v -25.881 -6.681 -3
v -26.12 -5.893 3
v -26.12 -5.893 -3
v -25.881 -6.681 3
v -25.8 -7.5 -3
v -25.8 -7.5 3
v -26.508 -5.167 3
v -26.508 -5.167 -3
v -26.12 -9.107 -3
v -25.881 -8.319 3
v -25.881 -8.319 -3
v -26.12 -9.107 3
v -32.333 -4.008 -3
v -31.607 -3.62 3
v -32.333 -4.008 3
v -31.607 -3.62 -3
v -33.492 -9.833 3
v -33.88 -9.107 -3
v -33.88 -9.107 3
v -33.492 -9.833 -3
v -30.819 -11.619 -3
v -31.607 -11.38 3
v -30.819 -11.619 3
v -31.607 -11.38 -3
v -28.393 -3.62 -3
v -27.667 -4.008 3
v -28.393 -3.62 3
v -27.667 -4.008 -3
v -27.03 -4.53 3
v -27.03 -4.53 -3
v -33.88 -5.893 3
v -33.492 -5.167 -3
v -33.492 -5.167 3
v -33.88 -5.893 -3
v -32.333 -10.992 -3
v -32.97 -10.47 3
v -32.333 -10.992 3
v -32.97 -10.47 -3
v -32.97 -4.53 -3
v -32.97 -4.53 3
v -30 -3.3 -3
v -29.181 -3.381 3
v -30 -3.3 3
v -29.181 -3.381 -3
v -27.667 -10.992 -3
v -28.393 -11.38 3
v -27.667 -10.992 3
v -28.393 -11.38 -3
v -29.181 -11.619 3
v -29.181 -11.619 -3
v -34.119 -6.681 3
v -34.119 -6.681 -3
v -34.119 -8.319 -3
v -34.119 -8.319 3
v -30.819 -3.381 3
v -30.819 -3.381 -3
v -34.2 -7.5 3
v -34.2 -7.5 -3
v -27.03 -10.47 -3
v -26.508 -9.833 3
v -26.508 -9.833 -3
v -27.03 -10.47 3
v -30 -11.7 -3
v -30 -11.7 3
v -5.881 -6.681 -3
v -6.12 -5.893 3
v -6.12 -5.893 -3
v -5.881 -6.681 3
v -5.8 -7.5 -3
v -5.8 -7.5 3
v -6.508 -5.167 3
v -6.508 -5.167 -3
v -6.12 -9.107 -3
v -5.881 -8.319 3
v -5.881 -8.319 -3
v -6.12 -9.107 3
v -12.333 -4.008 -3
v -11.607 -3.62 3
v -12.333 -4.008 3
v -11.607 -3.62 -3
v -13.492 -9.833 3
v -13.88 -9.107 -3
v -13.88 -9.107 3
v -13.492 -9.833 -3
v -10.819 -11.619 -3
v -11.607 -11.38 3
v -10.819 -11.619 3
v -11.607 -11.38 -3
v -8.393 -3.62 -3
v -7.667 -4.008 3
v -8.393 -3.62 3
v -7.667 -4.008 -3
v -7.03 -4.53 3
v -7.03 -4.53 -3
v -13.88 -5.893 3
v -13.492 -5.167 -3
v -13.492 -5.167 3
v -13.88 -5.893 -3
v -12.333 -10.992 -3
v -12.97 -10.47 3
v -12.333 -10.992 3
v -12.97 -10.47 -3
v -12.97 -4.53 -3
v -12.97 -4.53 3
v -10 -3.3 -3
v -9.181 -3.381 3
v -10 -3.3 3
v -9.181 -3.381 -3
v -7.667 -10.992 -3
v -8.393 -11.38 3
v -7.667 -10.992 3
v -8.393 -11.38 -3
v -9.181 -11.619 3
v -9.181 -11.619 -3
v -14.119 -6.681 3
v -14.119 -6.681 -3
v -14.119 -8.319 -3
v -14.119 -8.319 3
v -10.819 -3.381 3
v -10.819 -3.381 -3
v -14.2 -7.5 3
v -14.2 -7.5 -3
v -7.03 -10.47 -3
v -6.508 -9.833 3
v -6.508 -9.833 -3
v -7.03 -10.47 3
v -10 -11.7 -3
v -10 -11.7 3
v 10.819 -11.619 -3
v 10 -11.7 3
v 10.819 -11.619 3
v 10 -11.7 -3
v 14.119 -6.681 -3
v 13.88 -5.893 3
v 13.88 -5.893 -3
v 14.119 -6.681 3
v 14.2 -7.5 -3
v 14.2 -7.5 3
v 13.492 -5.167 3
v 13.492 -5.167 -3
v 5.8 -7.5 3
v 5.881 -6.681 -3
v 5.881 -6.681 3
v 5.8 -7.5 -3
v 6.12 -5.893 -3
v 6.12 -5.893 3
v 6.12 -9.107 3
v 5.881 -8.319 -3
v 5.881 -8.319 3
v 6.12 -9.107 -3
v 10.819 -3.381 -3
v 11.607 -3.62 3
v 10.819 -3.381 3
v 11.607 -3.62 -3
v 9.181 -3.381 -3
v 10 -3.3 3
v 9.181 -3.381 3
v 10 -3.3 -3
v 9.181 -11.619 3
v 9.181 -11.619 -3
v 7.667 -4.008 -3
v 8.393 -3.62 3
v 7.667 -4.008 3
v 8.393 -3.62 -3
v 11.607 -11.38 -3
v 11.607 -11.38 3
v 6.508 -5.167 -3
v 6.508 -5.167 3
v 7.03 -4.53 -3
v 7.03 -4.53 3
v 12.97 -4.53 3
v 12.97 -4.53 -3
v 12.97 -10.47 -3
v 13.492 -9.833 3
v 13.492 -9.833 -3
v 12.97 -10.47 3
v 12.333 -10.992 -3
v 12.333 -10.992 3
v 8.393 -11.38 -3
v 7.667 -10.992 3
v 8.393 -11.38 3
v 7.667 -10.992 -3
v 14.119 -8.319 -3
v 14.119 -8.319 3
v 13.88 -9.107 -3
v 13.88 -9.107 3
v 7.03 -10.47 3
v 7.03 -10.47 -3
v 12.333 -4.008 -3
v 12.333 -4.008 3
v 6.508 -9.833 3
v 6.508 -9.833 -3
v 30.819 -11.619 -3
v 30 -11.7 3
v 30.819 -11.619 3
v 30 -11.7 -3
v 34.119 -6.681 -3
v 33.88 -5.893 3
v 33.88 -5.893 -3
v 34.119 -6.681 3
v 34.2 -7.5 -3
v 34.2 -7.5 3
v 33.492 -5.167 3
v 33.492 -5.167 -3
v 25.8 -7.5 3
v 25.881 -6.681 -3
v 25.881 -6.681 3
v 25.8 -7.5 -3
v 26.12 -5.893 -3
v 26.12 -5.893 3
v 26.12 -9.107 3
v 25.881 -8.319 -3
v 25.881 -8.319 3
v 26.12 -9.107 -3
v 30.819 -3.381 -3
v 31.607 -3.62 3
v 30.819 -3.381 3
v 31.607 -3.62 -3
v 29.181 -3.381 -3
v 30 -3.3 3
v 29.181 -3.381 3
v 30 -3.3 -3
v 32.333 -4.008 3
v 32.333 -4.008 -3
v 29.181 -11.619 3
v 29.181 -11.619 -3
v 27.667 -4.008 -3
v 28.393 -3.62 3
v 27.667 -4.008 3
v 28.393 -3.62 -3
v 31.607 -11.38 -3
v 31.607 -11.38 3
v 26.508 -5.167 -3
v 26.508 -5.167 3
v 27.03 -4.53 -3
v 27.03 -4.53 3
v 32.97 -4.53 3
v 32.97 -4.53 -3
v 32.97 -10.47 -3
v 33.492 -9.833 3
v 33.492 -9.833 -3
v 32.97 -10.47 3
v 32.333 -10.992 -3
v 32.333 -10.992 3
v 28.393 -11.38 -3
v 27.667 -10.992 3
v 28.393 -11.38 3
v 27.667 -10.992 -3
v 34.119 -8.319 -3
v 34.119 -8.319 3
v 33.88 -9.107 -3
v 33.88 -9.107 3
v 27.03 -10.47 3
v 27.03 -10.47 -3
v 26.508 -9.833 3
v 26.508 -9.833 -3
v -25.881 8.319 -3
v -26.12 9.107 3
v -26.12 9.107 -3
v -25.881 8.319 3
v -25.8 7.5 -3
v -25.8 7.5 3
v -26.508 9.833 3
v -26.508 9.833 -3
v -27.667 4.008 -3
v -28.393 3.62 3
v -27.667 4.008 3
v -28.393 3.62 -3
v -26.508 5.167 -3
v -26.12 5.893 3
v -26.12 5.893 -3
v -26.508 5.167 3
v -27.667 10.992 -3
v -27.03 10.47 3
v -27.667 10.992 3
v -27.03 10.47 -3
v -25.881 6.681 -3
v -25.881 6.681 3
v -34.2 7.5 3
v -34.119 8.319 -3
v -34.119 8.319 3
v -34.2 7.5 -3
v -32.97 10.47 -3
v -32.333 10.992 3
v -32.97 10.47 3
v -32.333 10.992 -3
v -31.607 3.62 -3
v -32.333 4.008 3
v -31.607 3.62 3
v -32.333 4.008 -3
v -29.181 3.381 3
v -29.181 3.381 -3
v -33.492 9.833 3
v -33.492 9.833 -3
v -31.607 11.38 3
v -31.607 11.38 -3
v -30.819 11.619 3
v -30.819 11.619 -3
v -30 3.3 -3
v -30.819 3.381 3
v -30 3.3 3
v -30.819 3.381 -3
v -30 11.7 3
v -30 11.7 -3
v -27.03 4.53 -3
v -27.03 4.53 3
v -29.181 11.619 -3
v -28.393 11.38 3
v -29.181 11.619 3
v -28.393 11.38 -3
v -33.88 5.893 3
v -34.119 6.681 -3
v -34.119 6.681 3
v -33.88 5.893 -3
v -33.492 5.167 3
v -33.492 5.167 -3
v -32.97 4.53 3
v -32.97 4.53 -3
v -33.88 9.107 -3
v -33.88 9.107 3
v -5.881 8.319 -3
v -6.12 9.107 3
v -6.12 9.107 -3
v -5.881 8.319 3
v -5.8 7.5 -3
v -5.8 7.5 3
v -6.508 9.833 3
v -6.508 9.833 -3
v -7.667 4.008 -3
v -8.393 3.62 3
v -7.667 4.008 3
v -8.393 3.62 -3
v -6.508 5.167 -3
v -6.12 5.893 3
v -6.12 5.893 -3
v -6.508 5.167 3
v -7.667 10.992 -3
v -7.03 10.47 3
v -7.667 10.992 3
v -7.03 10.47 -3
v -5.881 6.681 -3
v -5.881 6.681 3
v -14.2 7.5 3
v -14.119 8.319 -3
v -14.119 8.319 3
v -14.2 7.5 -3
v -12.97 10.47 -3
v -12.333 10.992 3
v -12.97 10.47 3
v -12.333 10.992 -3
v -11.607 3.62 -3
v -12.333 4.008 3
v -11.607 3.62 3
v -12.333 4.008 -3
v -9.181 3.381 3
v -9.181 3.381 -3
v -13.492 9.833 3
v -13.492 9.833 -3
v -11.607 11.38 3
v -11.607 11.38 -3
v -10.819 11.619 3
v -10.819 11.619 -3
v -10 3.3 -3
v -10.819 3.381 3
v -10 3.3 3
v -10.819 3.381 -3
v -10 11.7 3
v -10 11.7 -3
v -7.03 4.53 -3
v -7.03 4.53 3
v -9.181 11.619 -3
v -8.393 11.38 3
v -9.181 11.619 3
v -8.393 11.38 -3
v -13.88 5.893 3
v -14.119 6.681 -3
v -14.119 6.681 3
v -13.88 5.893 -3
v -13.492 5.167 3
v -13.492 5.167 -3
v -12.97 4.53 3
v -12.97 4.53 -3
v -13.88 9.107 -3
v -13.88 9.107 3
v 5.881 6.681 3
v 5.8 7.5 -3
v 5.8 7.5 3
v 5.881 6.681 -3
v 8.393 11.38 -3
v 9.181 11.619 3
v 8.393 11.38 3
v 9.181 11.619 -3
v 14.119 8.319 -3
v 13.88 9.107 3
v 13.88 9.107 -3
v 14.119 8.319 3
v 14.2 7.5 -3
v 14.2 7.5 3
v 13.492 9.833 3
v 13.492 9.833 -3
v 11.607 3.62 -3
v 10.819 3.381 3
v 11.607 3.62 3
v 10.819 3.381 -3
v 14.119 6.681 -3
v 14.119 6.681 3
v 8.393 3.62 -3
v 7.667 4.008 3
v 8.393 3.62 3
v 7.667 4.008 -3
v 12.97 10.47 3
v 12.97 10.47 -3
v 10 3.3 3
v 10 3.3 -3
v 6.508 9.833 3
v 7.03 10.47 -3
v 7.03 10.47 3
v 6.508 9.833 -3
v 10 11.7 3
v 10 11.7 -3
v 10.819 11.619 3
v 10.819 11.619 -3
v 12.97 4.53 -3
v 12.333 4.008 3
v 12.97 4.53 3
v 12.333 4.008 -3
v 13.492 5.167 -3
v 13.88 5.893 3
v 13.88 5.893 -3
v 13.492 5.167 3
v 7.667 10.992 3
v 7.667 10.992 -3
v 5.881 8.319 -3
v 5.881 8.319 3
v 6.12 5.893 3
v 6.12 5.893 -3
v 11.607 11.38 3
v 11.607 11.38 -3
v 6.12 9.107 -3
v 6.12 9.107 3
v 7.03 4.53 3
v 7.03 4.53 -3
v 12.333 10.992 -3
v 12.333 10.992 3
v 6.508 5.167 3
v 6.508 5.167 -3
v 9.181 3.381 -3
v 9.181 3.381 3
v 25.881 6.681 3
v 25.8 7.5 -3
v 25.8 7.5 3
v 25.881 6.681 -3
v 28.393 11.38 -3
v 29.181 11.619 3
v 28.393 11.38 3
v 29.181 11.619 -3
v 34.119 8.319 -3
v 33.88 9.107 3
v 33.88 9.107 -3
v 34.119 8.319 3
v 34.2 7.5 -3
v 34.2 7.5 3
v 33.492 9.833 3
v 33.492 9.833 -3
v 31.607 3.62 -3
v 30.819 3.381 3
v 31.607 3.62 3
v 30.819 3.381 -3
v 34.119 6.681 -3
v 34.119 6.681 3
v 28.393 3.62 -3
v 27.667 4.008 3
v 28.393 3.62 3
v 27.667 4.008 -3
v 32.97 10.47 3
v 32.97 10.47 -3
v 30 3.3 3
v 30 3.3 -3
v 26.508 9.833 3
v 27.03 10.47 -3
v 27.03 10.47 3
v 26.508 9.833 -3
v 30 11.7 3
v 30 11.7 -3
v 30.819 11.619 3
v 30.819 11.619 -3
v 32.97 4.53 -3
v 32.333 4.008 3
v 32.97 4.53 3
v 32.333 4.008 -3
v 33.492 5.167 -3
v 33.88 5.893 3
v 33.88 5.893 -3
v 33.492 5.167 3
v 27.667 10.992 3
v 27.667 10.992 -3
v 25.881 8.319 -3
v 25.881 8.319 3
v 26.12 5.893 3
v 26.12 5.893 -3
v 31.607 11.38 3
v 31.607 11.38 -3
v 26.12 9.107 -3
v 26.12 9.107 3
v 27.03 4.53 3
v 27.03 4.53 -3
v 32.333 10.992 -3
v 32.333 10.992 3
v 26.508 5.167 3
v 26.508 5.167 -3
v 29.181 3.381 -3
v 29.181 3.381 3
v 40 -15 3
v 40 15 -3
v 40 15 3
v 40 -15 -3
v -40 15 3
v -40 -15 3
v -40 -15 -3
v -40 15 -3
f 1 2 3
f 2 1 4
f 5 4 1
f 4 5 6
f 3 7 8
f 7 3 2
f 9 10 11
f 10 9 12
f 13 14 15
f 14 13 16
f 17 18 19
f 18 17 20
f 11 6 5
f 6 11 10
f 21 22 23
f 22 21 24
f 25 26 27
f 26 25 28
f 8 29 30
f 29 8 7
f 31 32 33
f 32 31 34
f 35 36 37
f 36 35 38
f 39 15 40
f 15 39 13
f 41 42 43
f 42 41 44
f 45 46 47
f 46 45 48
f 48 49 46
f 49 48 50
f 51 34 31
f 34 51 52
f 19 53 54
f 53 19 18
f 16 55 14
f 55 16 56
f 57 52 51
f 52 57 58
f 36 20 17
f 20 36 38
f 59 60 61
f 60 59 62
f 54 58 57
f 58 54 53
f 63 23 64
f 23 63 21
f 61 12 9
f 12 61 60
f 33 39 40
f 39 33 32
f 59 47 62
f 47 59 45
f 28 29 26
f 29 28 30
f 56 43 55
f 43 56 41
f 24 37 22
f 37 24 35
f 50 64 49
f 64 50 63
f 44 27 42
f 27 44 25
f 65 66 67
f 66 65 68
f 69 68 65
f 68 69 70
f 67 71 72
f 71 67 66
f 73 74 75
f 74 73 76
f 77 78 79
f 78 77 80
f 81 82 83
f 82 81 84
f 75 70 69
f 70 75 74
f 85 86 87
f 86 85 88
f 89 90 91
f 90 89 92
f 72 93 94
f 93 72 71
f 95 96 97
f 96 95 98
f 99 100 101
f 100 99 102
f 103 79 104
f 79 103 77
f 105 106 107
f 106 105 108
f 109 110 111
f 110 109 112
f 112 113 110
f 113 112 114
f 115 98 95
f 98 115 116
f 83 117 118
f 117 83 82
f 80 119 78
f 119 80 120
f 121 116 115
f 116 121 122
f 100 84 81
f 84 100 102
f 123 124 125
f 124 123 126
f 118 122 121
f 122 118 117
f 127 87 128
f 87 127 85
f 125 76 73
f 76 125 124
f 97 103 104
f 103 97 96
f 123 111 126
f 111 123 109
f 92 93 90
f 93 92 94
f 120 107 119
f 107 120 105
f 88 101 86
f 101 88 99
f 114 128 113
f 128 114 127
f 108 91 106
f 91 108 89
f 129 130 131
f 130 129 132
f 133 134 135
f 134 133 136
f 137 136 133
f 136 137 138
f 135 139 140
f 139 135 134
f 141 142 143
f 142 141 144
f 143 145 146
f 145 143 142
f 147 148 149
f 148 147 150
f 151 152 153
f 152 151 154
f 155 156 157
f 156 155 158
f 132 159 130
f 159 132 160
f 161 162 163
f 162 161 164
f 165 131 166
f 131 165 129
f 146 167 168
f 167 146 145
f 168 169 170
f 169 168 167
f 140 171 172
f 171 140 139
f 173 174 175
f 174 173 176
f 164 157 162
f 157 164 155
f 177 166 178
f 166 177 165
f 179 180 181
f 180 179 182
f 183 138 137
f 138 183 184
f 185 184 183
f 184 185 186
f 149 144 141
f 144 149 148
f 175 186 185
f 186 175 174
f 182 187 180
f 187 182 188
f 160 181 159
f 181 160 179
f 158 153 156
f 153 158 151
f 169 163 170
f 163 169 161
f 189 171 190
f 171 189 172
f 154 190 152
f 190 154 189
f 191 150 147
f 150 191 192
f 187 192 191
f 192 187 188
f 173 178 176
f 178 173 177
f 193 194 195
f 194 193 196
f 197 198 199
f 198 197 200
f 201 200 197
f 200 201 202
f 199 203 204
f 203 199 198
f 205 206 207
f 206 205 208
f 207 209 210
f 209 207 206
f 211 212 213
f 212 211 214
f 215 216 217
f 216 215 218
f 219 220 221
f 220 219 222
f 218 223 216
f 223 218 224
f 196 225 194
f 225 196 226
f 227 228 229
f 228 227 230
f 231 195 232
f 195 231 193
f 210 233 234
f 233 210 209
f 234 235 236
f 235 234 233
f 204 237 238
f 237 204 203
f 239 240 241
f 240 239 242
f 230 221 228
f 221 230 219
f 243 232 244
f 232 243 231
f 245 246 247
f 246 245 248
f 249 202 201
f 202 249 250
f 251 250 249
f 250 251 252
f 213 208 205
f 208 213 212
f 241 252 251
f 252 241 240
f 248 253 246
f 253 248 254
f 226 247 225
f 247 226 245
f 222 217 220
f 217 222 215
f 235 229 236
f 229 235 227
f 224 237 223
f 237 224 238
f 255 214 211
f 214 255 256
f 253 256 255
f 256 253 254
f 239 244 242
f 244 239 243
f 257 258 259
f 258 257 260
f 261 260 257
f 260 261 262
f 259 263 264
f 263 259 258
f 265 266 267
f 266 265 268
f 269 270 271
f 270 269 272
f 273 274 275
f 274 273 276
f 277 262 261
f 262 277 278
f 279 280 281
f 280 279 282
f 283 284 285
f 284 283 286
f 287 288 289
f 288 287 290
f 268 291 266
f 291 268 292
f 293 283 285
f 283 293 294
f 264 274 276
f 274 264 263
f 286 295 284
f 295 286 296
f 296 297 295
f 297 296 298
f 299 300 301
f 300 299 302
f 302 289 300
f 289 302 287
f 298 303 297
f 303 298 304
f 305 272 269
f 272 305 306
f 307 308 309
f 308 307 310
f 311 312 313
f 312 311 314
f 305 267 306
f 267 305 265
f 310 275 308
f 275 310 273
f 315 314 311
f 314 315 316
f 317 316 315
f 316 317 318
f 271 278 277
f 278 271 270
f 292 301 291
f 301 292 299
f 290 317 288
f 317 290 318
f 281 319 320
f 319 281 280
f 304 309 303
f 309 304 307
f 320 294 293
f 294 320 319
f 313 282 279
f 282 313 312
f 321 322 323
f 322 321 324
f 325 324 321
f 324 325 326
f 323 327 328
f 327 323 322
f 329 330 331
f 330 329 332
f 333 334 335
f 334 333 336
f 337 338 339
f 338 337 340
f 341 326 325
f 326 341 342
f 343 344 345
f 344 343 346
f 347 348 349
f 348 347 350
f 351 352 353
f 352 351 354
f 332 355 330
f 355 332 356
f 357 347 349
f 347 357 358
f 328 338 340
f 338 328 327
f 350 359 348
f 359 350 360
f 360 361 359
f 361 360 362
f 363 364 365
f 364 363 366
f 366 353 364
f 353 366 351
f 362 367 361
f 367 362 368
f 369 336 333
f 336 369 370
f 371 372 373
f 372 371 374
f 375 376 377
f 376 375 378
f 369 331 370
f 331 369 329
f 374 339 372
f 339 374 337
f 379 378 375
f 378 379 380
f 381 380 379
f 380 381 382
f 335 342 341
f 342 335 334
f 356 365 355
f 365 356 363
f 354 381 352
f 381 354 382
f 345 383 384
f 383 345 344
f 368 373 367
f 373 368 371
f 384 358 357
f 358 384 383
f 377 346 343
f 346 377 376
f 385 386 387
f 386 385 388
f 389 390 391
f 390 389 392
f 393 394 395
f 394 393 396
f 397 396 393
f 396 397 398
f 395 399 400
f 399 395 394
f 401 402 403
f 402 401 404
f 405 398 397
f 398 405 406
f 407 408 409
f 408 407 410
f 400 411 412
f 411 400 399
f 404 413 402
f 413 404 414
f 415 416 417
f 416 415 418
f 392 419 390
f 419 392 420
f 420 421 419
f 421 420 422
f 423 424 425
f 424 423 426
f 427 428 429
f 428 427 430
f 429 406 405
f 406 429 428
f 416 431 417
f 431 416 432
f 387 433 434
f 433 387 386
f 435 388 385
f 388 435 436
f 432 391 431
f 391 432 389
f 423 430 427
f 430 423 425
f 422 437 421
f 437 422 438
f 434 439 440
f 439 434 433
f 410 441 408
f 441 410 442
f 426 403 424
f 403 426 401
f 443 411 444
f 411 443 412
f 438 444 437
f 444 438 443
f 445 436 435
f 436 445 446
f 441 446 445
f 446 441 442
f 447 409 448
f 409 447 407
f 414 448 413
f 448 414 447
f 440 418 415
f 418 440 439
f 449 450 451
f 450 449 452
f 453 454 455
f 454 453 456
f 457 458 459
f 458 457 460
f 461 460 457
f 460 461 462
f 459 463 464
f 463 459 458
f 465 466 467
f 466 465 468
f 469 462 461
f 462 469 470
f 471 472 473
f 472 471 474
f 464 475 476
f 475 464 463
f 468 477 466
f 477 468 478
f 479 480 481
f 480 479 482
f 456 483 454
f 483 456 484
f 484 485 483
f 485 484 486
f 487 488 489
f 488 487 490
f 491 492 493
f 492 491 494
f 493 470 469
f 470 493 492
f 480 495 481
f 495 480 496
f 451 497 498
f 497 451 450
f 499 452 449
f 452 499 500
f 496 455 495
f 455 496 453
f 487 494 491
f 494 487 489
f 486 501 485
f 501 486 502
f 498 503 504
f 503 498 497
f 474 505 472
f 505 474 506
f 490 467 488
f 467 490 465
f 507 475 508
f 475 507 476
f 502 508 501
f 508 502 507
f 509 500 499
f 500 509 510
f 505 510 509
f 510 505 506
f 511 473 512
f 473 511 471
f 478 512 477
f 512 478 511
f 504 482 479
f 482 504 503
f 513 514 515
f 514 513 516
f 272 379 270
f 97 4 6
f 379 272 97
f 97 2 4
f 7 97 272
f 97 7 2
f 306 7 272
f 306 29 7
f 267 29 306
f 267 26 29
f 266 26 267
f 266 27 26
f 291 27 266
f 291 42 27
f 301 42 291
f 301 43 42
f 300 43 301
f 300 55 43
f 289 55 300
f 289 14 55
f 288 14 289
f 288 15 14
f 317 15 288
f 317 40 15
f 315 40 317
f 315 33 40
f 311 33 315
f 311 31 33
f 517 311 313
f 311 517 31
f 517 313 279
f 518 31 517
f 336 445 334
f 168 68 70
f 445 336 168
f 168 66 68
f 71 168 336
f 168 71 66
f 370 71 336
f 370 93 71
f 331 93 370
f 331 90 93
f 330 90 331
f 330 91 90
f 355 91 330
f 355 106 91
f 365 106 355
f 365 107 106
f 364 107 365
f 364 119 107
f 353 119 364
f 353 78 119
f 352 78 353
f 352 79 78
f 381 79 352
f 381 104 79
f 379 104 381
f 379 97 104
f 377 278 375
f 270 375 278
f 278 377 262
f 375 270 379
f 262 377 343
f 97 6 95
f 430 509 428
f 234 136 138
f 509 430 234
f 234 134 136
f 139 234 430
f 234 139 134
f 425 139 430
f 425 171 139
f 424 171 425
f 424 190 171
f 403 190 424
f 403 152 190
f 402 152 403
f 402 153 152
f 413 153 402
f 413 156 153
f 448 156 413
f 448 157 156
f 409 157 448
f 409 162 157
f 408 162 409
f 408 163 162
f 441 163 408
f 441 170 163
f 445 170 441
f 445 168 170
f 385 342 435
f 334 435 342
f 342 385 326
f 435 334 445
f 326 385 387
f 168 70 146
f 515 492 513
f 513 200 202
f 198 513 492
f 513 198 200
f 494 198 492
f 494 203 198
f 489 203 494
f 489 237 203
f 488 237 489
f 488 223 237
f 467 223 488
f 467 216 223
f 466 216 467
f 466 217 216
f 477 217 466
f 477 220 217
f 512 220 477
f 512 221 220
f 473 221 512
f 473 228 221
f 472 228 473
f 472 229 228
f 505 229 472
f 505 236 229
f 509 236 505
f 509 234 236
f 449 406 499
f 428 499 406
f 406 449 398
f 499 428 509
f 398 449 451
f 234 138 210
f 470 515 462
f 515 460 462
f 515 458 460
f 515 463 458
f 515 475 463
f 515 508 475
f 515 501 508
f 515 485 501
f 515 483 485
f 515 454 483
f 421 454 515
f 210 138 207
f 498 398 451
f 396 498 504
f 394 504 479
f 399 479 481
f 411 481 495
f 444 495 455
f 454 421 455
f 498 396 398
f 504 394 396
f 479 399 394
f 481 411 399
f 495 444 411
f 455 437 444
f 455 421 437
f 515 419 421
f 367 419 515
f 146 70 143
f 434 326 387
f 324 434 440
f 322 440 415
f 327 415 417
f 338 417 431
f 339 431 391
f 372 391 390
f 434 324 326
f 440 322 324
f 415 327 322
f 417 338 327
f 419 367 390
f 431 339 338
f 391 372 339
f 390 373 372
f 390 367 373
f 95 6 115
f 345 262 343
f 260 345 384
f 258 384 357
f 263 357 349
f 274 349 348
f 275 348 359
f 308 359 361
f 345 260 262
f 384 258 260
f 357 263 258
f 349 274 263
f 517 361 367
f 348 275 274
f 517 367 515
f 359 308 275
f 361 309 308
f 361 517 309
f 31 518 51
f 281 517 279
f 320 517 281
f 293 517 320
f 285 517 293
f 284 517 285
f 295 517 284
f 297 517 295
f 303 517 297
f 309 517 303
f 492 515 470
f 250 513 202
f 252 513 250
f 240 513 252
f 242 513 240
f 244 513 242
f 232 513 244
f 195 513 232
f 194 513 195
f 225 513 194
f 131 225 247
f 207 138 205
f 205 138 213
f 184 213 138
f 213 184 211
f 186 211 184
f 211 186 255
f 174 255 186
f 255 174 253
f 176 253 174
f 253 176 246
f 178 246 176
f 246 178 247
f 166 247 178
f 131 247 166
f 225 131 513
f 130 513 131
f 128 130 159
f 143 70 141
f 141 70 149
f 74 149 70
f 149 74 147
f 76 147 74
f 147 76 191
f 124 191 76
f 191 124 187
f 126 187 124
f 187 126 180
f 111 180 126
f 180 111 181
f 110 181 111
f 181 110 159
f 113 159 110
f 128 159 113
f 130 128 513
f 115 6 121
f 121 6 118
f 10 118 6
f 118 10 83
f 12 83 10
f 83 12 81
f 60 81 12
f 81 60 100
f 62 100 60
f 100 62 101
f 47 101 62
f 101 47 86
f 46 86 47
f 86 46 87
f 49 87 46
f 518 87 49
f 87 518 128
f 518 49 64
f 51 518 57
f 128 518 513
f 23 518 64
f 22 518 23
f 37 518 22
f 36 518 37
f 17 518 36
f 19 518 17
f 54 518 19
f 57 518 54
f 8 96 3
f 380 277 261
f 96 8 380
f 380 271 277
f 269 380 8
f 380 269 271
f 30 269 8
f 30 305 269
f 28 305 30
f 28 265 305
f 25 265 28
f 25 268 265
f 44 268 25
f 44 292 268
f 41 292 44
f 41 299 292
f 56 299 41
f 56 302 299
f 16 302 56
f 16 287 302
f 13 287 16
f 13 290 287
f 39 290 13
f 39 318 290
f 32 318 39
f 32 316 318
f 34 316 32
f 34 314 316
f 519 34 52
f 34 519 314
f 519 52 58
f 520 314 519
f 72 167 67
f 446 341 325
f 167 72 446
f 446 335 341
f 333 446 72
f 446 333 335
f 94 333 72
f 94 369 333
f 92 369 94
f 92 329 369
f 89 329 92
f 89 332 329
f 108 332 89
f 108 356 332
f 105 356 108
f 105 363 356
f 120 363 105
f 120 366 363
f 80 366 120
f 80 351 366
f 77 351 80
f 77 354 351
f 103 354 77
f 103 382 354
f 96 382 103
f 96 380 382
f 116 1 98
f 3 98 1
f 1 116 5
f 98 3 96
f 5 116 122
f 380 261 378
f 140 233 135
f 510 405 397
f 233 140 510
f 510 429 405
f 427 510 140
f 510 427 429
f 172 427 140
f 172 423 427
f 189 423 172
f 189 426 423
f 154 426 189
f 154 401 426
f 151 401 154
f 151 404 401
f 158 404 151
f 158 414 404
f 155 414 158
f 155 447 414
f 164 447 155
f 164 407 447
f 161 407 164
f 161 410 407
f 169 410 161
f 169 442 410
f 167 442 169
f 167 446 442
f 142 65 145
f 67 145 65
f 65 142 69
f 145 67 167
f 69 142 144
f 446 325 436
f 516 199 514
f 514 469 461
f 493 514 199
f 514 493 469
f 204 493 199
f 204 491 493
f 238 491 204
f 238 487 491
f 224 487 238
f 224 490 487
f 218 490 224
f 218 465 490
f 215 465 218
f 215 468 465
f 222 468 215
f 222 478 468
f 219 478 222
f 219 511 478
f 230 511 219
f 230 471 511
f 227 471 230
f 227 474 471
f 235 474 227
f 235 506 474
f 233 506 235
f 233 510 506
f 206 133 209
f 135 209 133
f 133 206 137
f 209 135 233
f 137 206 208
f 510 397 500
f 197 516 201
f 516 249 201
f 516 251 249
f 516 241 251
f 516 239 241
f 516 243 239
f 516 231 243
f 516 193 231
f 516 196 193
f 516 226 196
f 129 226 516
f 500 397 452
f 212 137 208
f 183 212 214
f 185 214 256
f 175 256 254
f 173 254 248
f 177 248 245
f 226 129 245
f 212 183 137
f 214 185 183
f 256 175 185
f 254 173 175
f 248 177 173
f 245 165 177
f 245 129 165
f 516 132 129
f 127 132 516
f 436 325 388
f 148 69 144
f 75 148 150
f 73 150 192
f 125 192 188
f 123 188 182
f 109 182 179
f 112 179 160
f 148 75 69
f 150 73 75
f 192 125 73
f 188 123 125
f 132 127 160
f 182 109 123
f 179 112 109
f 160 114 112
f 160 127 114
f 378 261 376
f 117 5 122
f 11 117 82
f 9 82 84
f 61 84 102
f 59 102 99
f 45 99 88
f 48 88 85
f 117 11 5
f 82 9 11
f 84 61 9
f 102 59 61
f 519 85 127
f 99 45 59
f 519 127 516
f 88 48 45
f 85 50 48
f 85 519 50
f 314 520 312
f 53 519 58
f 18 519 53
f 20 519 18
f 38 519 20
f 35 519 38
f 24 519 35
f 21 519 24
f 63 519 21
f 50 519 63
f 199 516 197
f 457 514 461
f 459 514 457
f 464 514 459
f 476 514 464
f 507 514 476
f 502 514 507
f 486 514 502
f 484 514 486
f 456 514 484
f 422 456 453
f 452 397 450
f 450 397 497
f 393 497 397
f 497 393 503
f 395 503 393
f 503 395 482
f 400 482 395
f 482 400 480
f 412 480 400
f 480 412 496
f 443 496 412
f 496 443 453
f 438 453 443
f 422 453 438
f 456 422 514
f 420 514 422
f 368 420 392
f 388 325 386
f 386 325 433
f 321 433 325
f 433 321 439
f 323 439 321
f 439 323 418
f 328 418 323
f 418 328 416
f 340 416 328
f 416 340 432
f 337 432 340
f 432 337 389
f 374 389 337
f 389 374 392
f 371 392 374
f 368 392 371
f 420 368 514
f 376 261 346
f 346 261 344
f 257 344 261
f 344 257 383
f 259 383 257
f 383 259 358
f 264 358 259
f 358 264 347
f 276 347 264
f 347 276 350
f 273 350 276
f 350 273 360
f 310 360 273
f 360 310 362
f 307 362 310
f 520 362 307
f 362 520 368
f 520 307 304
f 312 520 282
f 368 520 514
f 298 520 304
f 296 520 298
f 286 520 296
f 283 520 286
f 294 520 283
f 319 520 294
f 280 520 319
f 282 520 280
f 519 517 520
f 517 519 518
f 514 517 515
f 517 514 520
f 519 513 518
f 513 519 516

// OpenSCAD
$fn = 32;

// ----------------------------------------------------------------------
// Hole bar, 4 x Ø8.4
// tworows layout, 10 mm edge offset
// ----------------------------------------------------------------------

// --- parameters (mm) ---
bar_w = 30;       // bar width (Y)
bar_t = 6;        // bar thickness (Z)
holes = 4;        // holes per row
hole_d = 8.4;     // hole diameter
edge = 10;        // offset from the bar end to the first hole
pitch = 20;       // pitch between neighbouring holes
row_offset = 15;  // distance between the two rows

// --- derived feature positions (mm) ---
span = (holes - 1) * pitch;   // = 60   distance between the end holes
bar_l = span + 2 * edge;      // = 80   overall bar length
start_x = -bar_l / 2 + edge;  // = -30   X of the first hole
feature_centers = [
  [start_x + 0 * pitch, -row_offset / 2],
  [start_x + 1 * pitch, -row_offset / 2],
  [start_x + 2 * pitch, -row_offset / 2],
  [start_x + 3 * pitch, -row_offset / 2]
];   // hole centres of the first row
row2_centers = [
  [start_x + 0 * pitch, row_offset / 2],
  [start_x + 1 * pitch, row_offset / 2],
  [start_x + 2 * pitch, row_offset / 2],
  [start_x + 3 * pitch, row_offset / 2]
];   // hole centres of the second row

// bar with two rows of holes, both read from their own centre arrays
difference() {
  translate([-bar_l / 2, -bar_w / 2, -bar_t / 2]) cube([bar_l, bar_w, bar_t]);
  for (centre = feature_centers)
    translate([centre[0], centre[1], 0])
      cylinder(d = hole_d, h = bar_t + 2, center = true);
  for (centre = row2_centers)
    translate([centre[0], centre[1], 0])
      cylinder(d = hole_d, h = bar_t + 2, center = true);
}
